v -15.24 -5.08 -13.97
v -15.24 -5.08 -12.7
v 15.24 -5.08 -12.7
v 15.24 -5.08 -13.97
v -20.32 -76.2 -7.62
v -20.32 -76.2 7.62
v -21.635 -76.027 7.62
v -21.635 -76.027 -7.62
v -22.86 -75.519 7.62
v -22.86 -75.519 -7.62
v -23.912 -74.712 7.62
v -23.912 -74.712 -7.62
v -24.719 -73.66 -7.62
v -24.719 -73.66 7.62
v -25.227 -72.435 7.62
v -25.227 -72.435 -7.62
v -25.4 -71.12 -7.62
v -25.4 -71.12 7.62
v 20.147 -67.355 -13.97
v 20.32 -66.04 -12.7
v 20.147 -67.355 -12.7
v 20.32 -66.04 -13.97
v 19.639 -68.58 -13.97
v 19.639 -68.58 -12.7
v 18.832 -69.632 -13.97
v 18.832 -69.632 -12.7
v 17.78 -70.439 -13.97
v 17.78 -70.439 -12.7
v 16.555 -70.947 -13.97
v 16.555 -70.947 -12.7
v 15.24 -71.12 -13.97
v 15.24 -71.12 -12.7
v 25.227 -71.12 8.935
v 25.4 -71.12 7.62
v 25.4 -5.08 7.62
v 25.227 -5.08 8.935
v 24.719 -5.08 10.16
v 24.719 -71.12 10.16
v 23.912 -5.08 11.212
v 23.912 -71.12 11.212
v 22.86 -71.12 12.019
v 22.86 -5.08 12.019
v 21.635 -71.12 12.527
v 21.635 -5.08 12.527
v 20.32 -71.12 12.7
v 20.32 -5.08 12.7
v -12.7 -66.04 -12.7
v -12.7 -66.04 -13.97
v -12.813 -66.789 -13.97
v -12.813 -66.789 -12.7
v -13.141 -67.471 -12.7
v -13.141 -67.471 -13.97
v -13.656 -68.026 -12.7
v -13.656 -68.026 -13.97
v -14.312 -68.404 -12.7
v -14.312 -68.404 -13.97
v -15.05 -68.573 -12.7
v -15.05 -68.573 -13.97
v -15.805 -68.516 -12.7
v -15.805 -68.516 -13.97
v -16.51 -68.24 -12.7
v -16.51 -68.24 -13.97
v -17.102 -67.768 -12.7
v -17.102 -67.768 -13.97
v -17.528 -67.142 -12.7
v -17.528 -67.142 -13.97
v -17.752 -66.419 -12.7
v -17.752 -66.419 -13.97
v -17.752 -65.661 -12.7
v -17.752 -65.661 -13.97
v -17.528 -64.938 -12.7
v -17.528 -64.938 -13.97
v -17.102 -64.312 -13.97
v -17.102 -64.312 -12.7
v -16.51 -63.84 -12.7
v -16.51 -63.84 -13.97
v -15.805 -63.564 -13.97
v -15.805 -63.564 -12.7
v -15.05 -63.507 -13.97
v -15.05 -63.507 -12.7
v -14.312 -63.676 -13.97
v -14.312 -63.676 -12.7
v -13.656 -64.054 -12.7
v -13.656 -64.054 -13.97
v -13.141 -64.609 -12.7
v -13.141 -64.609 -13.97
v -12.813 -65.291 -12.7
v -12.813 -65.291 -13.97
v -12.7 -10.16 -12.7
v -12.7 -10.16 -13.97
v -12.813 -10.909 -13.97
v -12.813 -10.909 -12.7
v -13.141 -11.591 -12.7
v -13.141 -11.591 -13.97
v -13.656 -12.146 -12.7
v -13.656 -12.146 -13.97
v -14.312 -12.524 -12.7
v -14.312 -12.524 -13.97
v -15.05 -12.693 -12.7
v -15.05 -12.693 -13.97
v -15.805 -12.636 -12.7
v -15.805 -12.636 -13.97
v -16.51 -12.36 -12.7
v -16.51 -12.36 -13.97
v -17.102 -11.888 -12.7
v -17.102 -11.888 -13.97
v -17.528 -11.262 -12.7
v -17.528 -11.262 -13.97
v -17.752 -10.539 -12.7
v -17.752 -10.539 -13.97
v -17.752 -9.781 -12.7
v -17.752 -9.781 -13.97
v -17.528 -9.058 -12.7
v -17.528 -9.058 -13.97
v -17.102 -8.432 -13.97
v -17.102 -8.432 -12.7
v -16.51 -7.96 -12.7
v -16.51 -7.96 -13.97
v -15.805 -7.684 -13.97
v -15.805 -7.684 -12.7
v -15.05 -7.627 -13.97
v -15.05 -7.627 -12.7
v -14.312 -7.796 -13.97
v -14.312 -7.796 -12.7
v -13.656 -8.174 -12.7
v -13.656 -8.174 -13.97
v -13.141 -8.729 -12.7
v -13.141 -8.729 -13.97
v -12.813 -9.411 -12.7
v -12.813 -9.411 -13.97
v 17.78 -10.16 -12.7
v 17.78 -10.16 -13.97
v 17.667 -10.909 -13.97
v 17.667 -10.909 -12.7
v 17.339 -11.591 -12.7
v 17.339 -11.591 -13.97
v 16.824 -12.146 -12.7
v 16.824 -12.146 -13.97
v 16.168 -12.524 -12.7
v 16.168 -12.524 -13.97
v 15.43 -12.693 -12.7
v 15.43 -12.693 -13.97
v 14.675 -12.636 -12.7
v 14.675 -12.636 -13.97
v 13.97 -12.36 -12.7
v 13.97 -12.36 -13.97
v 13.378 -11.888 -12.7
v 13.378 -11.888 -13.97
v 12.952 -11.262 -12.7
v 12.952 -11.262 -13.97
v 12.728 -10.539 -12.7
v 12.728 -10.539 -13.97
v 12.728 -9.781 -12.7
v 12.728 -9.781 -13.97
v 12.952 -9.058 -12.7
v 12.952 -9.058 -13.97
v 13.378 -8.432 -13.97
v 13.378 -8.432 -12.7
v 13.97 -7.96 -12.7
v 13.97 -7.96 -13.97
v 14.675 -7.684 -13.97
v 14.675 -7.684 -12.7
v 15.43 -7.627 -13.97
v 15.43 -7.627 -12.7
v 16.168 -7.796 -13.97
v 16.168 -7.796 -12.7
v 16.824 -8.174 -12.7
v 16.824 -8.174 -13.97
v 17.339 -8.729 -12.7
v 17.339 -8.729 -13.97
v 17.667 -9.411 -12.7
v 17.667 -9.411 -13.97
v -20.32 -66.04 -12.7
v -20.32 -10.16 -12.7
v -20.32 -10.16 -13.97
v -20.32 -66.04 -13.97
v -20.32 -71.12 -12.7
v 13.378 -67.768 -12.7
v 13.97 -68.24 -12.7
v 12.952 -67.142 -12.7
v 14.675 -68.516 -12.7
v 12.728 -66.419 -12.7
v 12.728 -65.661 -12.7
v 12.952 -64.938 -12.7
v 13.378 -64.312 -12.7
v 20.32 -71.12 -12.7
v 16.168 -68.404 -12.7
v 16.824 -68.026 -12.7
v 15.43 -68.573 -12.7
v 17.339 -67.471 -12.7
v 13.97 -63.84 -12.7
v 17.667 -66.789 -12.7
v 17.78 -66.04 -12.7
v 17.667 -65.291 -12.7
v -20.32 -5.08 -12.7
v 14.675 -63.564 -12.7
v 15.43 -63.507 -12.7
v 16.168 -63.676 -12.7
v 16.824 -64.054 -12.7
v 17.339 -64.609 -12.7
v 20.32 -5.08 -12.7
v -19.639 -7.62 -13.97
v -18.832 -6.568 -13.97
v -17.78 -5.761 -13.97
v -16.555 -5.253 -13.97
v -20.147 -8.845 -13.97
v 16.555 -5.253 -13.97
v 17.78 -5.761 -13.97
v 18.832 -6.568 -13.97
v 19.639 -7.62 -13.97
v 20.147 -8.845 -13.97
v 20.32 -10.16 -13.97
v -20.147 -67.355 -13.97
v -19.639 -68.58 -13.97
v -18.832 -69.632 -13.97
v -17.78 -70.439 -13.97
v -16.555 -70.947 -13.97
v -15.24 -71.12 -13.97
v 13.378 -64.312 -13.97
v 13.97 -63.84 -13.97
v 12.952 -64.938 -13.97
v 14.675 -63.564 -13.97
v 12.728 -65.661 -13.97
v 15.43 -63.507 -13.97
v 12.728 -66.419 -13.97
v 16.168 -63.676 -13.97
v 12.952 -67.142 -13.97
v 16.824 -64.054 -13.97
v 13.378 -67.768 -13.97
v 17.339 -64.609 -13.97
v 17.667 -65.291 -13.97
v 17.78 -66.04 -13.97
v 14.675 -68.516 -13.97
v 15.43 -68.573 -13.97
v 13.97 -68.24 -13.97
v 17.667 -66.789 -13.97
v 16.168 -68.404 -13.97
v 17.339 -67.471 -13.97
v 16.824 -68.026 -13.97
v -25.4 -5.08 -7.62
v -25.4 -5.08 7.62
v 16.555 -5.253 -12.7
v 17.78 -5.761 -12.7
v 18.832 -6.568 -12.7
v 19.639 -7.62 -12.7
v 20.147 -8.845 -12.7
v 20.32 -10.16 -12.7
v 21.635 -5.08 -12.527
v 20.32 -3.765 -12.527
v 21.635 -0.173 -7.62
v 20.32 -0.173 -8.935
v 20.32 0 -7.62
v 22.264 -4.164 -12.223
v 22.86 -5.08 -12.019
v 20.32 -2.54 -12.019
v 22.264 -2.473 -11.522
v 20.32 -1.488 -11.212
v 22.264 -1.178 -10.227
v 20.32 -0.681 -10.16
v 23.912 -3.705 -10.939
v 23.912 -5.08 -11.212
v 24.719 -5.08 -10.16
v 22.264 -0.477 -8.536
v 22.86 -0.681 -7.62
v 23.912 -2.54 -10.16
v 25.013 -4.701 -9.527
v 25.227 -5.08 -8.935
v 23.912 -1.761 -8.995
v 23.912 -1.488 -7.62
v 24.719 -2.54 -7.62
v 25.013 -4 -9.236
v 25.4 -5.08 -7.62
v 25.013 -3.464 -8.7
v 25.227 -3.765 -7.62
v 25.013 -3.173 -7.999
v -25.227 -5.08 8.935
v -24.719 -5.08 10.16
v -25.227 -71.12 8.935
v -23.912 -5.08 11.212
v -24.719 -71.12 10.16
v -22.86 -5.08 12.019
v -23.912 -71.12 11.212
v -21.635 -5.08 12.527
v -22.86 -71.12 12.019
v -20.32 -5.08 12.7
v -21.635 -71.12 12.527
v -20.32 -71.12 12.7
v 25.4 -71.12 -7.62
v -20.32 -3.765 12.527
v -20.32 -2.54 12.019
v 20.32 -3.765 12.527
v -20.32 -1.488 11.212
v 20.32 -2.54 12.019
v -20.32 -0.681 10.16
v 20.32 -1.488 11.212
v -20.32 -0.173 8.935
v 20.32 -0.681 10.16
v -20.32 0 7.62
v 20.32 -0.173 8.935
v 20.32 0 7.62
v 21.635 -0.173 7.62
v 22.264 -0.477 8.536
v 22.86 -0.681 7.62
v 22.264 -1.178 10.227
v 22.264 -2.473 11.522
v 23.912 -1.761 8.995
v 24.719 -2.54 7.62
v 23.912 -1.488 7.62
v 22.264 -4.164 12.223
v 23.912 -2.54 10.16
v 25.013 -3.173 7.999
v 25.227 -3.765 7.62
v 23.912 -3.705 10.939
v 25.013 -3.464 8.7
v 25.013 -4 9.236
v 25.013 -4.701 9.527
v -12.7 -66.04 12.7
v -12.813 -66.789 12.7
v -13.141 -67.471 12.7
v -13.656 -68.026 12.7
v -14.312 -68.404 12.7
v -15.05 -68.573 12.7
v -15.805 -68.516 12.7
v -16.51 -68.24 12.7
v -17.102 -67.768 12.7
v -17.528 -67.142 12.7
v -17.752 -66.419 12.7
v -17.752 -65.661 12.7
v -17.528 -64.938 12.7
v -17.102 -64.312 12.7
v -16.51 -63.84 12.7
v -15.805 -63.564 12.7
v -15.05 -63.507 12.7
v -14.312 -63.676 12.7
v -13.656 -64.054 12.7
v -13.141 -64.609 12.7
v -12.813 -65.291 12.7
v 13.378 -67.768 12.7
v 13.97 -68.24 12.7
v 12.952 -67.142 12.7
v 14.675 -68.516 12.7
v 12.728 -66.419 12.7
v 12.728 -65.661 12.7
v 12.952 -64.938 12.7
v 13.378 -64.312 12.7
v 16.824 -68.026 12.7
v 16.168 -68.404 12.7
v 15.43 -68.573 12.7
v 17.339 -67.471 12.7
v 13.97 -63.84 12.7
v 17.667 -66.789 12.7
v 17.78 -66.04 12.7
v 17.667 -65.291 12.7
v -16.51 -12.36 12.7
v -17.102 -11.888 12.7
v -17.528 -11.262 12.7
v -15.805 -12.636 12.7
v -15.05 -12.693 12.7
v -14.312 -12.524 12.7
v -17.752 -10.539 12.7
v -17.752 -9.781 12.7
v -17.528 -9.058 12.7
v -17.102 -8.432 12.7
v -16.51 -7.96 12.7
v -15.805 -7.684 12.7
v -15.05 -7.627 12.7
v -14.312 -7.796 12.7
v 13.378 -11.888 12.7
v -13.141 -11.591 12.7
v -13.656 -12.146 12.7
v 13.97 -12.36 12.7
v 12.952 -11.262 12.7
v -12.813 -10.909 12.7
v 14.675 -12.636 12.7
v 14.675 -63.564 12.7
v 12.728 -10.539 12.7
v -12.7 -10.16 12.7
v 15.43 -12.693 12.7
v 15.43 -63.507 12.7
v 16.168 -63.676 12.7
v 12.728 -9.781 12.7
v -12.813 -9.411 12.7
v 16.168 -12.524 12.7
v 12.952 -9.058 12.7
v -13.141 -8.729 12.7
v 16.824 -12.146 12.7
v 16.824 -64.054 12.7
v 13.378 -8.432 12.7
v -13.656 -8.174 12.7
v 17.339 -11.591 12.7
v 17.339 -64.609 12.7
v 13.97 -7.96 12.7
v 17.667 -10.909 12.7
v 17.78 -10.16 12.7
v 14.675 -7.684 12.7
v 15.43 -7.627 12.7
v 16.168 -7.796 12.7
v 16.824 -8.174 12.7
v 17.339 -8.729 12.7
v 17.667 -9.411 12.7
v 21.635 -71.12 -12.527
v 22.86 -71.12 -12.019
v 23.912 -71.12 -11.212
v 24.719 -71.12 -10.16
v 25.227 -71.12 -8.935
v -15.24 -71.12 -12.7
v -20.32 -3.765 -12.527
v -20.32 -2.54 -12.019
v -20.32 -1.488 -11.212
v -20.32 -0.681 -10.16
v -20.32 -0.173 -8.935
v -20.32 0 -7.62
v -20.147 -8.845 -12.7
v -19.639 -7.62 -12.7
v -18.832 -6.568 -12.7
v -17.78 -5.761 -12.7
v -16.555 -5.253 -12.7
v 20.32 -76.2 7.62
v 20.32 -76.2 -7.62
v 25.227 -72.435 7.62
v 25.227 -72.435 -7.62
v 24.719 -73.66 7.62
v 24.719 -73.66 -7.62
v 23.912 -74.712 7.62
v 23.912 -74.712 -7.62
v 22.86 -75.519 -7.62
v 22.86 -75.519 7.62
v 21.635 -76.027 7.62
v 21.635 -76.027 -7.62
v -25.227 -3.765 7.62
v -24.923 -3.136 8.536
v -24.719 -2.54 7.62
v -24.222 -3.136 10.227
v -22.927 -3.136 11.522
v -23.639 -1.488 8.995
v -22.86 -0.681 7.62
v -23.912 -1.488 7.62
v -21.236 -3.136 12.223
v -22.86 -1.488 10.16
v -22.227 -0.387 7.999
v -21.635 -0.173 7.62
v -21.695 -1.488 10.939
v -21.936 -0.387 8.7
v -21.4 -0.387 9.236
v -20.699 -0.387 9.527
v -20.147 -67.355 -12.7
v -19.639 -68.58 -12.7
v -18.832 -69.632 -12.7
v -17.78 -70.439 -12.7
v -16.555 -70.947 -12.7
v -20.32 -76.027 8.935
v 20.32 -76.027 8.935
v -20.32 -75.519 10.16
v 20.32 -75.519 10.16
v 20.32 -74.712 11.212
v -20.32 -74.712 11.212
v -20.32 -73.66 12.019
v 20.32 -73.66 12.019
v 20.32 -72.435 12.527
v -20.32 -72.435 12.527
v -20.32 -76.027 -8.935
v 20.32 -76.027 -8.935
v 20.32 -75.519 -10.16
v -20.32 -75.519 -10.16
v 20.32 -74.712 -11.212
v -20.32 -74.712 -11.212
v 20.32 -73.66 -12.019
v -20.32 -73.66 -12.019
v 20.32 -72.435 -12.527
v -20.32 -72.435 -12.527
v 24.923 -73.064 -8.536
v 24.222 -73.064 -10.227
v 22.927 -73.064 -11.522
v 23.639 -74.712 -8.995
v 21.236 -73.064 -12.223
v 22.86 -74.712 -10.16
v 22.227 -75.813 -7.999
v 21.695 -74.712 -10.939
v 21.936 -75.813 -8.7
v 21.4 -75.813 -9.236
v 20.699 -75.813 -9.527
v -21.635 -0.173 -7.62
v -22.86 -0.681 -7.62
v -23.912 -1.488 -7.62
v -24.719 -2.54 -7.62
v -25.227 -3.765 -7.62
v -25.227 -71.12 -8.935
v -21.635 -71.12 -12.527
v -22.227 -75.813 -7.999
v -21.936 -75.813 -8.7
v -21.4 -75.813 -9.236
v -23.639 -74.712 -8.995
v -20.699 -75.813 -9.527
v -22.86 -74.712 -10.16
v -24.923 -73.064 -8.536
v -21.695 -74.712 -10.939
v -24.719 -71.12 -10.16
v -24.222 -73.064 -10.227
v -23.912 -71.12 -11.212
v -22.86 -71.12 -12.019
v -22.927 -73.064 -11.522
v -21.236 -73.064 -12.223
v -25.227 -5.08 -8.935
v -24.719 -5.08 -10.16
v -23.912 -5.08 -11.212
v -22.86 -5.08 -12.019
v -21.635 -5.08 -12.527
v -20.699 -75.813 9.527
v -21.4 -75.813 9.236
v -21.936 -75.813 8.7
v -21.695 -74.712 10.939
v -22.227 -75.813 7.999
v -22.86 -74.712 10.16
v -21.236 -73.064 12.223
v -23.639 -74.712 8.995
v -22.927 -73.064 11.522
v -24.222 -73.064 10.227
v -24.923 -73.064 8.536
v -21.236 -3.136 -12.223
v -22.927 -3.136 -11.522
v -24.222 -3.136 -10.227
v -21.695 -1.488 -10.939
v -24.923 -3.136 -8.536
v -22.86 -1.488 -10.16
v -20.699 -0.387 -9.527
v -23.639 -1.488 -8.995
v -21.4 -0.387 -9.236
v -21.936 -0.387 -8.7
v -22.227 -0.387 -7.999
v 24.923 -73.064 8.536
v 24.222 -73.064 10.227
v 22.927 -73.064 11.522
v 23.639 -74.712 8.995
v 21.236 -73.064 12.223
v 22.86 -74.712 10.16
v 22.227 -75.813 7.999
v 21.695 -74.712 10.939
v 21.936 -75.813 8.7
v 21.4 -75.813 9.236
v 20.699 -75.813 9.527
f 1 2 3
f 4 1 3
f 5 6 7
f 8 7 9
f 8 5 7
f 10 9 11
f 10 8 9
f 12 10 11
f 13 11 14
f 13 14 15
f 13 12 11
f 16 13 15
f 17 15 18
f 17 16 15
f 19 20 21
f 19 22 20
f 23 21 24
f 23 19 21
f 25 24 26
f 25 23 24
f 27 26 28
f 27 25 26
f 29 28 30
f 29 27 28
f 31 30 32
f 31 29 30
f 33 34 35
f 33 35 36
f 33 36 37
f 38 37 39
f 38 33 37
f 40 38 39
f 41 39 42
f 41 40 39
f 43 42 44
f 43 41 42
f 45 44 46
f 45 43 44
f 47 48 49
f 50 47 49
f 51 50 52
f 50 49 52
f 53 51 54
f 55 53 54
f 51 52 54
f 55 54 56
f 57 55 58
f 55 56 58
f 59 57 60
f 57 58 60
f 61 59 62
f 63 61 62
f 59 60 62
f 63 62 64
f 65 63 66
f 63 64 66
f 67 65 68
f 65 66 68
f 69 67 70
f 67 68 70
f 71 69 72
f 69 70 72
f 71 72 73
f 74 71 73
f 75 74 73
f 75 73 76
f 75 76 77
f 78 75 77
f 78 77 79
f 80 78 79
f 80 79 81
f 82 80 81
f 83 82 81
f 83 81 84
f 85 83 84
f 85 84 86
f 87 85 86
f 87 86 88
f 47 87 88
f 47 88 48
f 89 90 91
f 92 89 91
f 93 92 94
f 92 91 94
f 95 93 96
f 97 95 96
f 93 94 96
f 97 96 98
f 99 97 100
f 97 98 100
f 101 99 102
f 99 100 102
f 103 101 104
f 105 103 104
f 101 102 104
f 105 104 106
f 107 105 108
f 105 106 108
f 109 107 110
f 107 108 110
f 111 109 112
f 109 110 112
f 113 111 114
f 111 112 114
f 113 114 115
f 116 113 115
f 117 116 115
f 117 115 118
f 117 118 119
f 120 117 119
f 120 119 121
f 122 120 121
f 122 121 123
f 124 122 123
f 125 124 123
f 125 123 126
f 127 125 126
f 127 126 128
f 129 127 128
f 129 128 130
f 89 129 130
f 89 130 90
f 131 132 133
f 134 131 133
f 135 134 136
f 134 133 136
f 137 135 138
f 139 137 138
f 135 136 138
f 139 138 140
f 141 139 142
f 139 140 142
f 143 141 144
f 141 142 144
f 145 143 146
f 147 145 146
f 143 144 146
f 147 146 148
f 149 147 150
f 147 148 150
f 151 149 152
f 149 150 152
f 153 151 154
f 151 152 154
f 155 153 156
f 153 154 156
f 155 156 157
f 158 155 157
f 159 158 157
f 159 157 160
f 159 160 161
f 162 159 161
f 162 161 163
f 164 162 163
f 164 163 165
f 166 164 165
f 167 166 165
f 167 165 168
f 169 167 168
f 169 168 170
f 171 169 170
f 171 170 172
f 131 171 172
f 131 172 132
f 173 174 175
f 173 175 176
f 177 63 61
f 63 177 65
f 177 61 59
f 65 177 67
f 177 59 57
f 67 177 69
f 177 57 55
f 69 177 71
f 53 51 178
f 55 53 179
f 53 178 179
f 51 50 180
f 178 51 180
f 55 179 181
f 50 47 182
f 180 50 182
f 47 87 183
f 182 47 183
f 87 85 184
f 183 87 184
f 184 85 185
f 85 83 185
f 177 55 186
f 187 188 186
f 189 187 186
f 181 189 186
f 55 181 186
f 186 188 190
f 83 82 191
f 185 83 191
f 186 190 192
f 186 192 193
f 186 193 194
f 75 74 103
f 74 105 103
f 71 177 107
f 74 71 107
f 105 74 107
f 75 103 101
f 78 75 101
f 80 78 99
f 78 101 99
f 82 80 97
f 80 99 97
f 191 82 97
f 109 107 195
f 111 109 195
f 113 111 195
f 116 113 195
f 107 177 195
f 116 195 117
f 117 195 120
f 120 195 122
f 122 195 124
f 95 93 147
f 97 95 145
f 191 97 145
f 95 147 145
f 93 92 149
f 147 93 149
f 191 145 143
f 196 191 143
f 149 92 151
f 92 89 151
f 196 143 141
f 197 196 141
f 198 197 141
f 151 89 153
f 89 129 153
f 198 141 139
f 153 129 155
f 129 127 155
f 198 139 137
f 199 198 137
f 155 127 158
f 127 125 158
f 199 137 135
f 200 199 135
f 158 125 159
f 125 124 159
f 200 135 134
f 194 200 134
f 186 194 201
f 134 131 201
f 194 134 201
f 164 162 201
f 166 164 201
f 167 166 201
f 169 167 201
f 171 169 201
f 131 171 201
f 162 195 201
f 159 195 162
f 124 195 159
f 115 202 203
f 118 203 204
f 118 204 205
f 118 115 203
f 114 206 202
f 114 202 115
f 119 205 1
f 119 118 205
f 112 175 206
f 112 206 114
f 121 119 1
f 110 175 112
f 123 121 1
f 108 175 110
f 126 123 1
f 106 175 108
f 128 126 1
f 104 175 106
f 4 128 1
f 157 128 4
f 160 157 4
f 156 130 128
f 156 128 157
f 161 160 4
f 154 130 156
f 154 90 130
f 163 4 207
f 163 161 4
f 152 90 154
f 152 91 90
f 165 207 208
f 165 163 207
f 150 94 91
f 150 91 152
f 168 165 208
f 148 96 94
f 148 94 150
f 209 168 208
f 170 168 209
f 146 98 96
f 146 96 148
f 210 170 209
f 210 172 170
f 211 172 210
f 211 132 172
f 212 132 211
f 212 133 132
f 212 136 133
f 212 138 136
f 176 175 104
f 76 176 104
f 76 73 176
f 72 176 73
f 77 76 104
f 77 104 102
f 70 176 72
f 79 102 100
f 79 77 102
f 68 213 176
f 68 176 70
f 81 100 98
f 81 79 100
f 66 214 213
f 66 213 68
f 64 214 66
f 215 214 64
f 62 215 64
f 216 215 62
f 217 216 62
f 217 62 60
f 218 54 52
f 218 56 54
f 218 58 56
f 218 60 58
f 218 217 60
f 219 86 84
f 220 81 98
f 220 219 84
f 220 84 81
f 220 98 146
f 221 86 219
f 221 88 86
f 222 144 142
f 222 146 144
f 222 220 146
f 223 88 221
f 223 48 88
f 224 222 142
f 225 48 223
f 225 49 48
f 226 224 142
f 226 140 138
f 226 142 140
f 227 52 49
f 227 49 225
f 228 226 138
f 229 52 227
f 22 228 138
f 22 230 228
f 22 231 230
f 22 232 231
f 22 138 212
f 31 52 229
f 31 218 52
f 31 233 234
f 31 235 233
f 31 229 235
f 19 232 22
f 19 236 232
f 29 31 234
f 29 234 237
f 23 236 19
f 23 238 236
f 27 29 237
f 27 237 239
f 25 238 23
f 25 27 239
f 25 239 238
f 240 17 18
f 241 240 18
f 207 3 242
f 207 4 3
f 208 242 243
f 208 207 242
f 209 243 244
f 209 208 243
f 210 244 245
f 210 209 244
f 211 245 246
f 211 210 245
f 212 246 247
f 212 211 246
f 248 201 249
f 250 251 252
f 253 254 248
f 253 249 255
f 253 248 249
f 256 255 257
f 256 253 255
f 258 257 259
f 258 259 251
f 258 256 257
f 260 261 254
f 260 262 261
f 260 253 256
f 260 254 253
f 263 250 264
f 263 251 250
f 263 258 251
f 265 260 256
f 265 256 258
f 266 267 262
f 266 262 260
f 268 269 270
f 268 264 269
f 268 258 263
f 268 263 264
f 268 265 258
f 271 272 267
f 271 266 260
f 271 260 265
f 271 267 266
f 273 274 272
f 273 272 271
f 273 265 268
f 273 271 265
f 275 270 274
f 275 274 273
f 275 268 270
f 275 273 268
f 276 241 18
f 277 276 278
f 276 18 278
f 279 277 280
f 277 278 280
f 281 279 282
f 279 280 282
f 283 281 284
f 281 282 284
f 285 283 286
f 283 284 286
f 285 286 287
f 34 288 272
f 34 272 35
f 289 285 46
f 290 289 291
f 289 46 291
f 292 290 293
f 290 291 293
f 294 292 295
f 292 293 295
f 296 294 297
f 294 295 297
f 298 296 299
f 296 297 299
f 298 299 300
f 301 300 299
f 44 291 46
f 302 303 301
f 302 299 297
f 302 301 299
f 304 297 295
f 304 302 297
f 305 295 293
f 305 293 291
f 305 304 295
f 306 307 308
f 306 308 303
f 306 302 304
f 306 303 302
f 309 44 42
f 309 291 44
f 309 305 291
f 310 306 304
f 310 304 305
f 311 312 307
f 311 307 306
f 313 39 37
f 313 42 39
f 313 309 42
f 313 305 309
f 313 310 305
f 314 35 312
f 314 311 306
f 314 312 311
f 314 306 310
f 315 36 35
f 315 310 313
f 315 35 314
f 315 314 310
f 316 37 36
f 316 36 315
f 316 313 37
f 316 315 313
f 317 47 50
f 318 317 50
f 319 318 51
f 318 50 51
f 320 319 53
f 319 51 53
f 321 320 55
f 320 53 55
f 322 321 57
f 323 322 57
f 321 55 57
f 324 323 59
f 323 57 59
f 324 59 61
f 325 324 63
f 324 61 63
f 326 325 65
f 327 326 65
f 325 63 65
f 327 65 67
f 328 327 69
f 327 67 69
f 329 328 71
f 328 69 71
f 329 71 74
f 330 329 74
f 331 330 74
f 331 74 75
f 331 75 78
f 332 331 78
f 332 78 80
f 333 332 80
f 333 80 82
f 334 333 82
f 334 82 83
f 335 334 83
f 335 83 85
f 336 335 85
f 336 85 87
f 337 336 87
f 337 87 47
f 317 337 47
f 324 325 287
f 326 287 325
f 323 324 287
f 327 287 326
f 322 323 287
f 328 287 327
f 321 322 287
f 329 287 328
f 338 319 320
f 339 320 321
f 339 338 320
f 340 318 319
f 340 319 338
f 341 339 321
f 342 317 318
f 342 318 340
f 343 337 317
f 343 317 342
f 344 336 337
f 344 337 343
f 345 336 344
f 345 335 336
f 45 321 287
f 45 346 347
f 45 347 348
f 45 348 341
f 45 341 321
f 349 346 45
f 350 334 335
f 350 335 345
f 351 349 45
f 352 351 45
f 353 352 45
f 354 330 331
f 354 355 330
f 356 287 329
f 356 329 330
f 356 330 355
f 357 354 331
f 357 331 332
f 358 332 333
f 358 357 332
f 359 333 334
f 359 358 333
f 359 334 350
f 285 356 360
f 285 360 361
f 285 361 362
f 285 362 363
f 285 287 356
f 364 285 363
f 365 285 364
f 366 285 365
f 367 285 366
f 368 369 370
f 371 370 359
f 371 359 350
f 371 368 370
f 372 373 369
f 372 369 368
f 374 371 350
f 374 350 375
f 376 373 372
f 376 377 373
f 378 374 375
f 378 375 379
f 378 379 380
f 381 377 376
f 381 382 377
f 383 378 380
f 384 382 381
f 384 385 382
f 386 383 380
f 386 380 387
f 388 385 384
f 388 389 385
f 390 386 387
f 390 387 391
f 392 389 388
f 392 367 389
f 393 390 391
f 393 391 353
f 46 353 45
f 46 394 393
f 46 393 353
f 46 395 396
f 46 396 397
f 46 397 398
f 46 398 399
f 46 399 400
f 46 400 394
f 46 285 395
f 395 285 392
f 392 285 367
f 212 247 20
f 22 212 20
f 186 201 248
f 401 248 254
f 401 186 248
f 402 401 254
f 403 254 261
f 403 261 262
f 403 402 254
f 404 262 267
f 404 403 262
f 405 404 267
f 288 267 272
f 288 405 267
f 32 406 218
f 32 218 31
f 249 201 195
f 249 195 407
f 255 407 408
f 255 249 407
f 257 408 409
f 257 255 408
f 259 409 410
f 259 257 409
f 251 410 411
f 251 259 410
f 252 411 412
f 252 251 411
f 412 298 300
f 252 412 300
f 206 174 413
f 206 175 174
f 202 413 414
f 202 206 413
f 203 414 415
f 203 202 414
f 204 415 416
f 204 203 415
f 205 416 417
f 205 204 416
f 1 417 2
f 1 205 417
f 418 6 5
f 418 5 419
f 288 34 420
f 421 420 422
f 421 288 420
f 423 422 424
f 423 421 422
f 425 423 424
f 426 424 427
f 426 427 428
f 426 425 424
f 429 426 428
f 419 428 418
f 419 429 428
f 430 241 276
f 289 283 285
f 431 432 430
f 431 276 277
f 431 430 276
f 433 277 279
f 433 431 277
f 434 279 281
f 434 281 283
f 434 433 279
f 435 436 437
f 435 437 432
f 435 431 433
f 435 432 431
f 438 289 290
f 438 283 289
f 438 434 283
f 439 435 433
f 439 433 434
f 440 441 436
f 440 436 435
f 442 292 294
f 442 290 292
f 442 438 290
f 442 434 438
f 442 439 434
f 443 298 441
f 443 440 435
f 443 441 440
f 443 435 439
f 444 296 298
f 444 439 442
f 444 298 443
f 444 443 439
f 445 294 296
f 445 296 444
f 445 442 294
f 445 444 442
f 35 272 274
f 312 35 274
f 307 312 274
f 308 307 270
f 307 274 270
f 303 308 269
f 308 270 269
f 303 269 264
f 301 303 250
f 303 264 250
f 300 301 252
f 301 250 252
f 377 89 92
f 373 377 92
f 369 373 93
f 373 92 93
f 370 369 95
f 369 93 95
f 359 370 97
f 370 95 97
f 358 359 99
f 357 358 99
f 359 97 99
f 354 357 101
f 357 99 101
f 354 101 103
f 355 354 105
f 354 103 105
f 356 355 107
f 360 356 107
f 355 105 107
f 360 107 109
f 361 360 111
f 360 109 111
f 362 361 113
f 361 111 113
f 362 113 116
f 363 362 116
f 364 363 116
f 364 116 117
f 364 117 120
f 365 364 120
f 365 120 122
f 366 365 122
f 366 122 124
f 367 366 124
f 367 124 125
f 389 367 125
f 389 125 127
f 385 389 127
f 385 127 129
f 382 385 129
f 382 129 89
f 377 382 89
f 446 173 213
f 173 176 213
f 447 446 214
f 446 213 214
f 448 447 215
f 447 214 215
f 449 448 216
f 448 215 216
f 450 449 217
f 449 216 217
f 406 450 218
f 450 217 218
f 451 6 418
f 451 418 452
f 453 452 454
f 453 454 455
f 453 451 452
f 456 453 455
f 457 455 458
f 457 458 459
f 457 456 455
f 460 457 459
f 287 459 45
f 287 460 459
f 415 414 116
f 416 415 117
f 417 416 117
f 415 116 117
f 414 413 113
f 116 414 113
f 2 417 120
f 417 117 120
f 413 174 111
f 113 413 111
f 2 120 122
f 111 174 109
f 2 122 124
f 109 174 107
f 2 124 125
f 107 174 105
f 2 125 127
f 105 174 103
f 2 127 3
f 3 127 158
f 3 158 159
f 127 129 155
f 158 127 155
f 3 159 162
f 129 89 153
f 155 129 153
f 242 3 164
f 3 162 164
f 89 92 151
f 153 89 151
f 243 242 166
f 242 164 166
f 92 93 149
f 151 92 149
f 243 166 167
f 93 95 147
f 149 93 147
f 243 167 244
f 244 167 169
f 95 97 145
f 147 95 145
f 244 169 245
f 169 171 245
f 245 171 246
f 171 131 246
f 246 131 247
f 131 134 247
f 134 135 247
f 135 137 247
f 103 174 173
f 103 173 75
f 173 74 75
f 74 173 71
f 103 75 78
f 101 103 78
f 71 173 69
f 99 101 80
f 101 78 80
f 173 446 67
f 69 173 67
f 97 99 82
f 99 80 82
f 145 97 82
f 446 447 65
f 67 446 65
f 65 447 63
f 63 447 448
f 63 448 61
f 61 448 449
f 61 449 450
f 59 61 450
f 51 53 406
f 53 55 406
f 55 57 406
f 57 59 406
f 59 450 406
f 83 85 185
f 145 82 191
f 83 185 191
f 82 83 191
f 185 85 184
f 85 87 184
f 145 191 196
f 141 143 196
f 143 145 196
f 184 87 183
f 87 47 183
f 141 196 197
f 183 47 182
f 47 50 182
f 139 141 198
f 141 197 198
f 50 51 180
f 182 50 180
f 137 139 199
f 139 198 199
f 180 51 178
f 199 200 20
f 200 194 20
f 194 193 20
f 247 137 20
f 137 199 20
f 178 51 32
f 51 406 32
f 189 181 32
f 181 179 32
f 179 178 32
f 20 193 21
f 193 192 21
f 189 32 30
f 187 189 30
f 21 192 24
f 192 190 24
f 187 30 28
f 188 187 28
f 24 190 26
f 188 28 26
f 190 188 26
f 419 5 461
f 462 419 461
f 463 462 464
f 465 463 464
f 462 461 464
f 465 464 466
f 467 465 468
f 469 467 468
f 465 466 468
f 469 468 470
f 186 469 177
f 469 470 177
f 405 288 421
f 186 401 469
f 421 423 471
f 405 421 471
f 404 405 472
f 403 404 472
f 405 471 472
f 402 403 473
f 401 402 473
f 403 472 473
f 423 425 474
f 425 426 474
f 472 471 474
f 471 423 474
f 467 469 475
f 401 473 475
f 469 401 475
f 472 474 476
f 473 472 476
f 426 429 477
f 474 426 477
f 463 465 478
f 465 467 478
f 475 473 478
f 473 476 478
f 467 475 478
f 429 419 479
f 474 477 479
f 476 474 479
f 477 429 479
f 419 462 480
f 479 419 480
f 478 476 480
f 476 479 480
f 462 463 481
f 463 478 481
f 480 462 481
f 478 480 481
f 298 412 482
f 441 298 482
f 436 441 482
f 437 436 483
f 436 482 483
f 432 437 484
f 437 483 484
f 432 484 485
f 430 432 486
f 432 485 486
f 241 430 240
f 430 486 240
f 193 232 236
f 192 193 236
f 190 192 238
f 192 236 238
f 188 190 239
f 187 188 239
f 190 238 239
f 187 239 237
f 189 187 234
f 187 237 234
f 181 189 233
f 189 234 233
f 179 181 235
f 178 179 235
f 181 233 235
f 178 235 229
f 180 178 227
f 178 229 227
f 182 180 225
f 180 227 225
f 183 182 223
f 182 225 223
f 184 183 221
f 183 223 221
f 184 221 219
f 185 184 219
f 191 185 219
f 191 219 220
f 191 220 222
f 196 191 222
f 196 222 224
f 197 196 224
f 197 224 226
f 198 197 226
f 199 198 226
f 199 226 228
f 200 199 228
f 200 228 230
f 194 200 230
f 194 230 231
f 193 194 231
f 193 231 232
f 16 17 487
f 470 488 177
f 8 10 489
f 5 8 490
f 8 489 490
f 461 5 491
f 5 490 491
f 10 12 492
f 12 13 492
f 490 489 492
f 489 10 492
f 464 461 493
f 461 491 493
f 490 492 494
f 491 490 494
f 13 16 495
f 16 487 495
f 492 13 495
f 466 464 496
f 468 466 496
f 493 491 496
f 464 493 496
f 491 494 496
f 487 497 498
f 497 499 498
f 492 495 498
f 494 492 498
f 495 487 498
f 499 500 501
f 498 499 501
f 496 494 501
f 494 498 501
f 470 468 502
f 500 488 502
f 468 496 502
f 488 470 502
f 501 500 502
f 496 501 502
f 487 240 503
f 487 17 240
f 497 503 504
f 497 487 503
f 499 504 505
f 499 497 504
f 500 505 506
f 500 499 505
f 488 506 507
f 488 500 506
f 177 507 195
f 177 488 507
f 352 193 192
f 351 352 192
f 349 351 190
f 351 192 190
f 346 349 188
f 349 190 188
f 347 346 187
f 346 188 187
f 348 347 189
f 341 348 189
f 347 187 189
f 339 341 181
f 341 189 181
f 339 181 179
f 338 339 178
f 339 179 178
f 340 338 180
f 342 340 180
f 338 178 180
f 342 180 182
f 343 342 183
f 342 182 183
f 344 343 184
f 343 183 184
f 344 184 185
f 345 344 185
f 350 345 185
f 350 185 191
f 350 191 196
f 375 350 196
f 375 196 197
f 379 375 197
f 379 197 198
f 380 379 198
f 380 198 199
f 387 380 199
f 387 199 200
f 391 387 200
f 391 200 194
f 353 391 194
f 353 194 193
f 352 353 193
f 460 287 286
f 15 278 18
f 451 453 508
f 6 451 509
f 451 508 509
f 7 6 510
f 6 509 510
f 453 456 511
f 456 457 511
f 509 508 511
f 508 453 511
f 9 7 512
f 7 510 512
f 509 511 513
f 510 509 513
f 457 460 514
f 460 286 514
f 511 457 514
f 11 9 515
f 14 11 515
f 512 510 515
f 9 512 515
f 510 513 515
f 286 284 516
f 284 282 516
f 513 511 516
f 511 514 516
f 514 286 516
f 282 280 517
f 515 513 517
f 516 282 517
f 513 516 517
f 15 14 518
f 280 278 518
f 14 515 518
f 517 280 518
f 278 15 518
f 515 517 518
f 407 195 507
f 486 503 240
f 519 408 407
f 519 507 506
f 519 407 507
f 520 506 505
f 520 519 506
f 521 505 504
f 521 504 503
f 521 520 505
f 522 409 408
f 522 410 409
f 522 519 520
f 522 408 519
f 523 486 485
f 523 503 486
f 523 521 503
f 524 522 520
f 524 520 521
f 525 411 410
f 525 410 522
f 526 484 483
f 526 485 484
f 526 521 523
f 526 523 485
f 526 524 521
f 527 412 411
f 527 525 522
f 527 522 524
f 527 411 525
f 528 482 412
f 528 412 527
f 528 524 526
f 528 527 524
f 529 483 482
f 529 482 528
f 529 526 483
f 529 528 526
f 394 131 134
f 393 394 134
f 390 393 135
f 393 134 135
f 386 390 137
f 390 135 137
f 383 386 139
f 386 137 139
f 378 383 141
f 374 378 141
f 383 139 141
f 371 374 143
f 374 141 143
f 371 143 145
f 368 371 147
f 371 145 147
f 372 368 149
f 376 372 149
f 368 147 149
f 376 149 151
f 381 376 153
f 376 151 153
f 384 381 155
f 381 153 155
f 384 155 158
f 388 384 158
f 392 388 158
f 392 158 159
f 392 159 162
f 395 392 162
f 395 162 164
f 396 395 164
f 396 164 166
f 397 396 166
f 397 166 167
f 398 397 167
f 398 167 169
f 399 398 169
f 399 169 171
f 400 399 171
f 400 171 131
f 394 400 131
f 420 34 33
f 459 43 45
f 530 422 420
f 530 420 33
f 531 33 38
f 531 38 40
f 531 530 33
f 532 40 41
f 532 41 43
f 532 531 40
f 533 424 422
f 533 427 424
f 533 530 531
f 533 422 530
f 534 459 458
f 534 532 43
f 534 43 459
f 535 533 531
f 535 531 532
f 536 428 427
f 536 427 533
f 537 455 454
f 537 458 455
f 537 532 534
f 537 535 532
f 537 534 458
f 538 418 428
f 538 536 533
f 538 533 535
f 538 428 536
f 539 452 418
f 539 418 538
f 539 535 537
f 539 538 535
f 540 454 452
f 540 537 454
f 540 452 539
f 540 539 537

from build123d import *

# Parameters (mm, degrees)
F0_W         = 50.8
F0_H         = 25.4
F1_DEPTH     = 76.2
F2_R         = 5.08
F3_T1_DEPTH  = 15.24
F3_T3_DEPTH  = 40.64
F3_S7_W      = 5.08
F3_S7_H      = 5.08
F3_T8_DEPTH  = 5.08
F3_S13_W     = 5.08
F3_S13_H     = 5.08
F3_T14_DEPTH = 5.08
F3_S19_W     = 5.08
F3_S19_H     = 5.08
F3_T20_DEPTH = 5.08
F3_S25_W     = 5.08
F3_S25_H     = 5.08
F3_T26_DEPTH = 5.08
F3_T30_ANGLE = 90
F3_T32_ANGLE = 90
F3_T34_ANGLE = 90
F3_T36_ANGLE = 90
F5_W         = 40.64
F5_H         = 66.04
F6_DEPTH     = 1.27
F7_R         = 5.08
F8_R         = 2.54
F9_DEPTH     = 101.6
F10_R        = 2.54
F11_DEPTH    = 101.6


# Not quite as in the source:
# - a fillet or chamfer that OpenCascade refuses, or shapes differently, is made with other operations: its cross-section is extruded or revolved along the edge and cut away or added
# - two fillets or chamfers of one size are made in one step


with BuildPart() as f1:
    # F0 (on Front) → F1 (new body)
    with BuildSketch(Plane.XZ):
        Rectangle(F0_W, F0_H)
    extrude(amount=F1_DEPTH)

    # F2
    f2_edges = [f1.edges().sort_by_distance(p)[0] for p in [
        (25.4, -38.1, 12.7),
        (0, 0, 12.7),
        (-25.4, -38.1, 12.7),
        (25.4, -38.1, -12.7),
        (-25.4, -38.1, -12.7),
        (0, 0, -12.7),
    ]]
    fillet(f2_edges, radius=F2_R)

    # F3: fillet of radius 5.08 on 12 edges, made by hand

    # F3_s2 → F3_t1 (cut)
    with BuildSketch(Plane.XY.offset(-7.62)):
        with BuildLine():
            ThreePointArc((25.4, -5.08), (23.9121024484, -1.4878975516), (20.32, 0))
            Line((20.32, 0), (25.4, 0))
            Line((25.4, 0), (25.4, -5.08))
        make_face()
        with BuildLine():
            ThreePointArc((25.4, -71.12), (23.9121024484, -74.7121024484), (20.32, -76.2))
            Line((20.32, -76.2), (25.4, -76.2))
            Line((25.4, -76.2), (25.4, -71.12))
        make_face()
        with BuildLine():
            ThreePointArc((-20.32, 0), (-23.9121024484, -1.4878975516), (-25.4, -5.08))
            Line((-25.4, -5.08), (-25.4, 0))
            Line((-25.4, 0), (-20.32, 0))
        make_face()
        with BuildLine():
            ThreePointArc((-20.32, -76.2), (-23.9121024484, -74.7121024484), (-25.4, -71.12))
            Line((-25.4, -71.12), (-25.4, -76.2))
            Line((-25.4, -76.2), (-20.32, -76.2))
        make_face()
    extrude(amount=F3_T1_DEPTH, mode=Mode.SUBTRACT)

    # F3_s4 → F3_t3 (cut)
    with BuildSketch(Plane.YZ.offset(-20.32)):
        with BuildLine():
            ThreePointArc((-76.2, -7.62), (-74.7121024484, -11.2121024484), (-71.12, -12.7))
            Line((-71.12, -12.7), (-76.2, -12.7))
            Line((-76.2, -12.7), (-76.2, -7.62))
        make_face()
        with BuildLine():
            ThreePointArc((-76.2, 7.62), (-74.7121024484, 11.2121024484), (-71.12, 12.7))
            Line((-71.12, 12.7), (-76.2, 12.7))
            Line((-76.2, 12.7), (-76.2, 7.62))
        make_face()
    extrude(amount=F3_T3_DEPTH, mode=Mode.SUBTRACT)


with BuildPart() as f3_tool6:
    # F3_s7 → F3_t8 (new body)
    with BuildSketch(Plane.YZ.offset(20.32)):
        with Locations((-2.54, 10.16)):
            Rectangle(F3_S7_W, F3_S7_H)
    extrude(amount=F3_T8_DEPTH)

    # F3_s9 → F3_t10 (revolve, cut)
    with BuildSketch(Plane(origin=(20.32, -5.08, 7.62), x_dir=(0, -0.7071067812, -0.7071067812), z_dir=(0, -0.7071067812, 0.7071067812))):
        with BuildLine():
            ThreePointArc((0, -5.08), (5.08, 0), (0, 5.08))
            Line((0, 5.08), (0, -5.08))
        make_face()
    revolve(axis=Axis((20.32, -5.08, 7.62), (1, 0, 0)), mode=Mode.SUBTRACT)


with BuildPart() as f1_1:
    add(f1.part)

    # F3_t5: cut F3_tool6
    add(f3_tool6.part, mode=Mode.SUBTRACT)


with BuildPart() as f3_tool12:
    # F3_s13 → F3_t14 (new body)
    with BuildSketch(Plane.XZ.offset(5.08)):
        with Locations((-22.86, 10.16)):
            Rectangle(F3_S13_W, F3_S13_H)
    extrude(amount=-F3_T14_DEPTH)

    # F3_s15 → F3_t16 (revolve, cut)
    with BuildSketch(Plane(origin=(-20.32, -5.08, 7.62), x_dir=(0.7071067812, 0, -0.7071067812), z_dir=(0.7071067812, 0, 0.7071067812))):
        with BuildLine():
            ThreePointArc((0, -5.08), (5.08, 0), (0, 5.08))
            Line((0, 5.08), (0, -5.08))
        make_face()
    revolve(axis=Axis((-20.32, -5.08, 7.62), (0, 1, 0)), mode=Mode.SUBTRACT)


with BuildPart() as f1_2:
    add(f1_1.part)

    # F3_t11: cut F3_tool12
    add(f3_tool12.part, mode=Mode.SUBTRACT)


with BuildPart() as f3_tool18:
    # F3_s19 → F3_t20 (new body)
    with BuildSketch(Plane.XZ.offset(5.08)):
        with Locations((-22.86, -10.16)):
            Rectangle(F3_S19_W, F3_S19_H)
    extrude(amount=-F3_T20_DEPTH)

    # F3_s21 → F3_t22 (revolve, cut)
    with BuildSketch(Plane(origin=(-20.32, -5.08, -7.62), x_dir=(0.7071067812, 0, 0.7071067812), z_dir=(-0.7071067812, 0, 0.7071067812))):
        with BuildLine():
            ThreePointArc((0, -5.08), (5.08, 0), (0, 5.08))
            Line((0, 5.08), (0, -5.08))
        make_face()
    revolve(axis=Axis((-20.32, -5.08, -7.62), (0, 1, 0)), mode=Mode.SUBTRACT)


with BuildPart() as f1_3:
    add(f1_2.part)

    # F3_t17: cut F3_tool18
    add(f3_tool18.part, mode=Mode.SUBTRACT)


with BuildPart() as f3_tool24:
    # F3_s25 → F3_t26 (new body)
    with BuildSketch(Plane.YZ.offset(20.32)):
        with Locations((-2.54, -10.16)):
            Rectangle(F3_S25_W, F3_S25_H)
    extrude(amount=F3_T26_DEPTH)

    # F3_s27 → F3_t28 (revolve, cut)
    with BuildSketch(Plane(origin=(20.32, -5.08, -7.62), x_dir=(0, -0.7071067812, 0.7071067812), z_dir=(0, 0.7071067812, 0.7071067812))):
        with BuildLine():
            ThreePointArc((0, -5.08), (5.08, 0), (0, 5.08))
            Line((0, 5.08), (0, -5.08))
        make_face()
    revolve(axis=Axis((20.32, -5.08, -7.62), (1, 0, 0)), mode=Mode.SUBTRACT)


with BuildPart() as f1_4:
    add(f1_3.part)

    # F3_t23: cut F3_tool24
    add(f3_tool24.part, mode=Mode.SUBTRACT)

    # F3_s29 → F3_t30 (revolve, cut)
    with BuildSketch(Plane.XY.offset(-7.62)):
        with BuildLine():
            ThreePointArc((25.4, -71.12), (23.9121024484, -74.7121024484), (20.32, -76.2))
            Line((20.32, -76.2), (25.4, -76.2))
            Line((25.4, -76.2), (25.4, -71.12))
        make_face()
    revolve(axis=Axis((20.32, -76.2, -7.62), (0, 1, 0)), revolution_arc=F3_T30_ANGLE, mode=Mode.SUBTRACT)

    # F3_s31 → F3_t32 (revolve, cut)
    with BuildSketch(Plane.XY.offset(7.62)):
        with BuildLine():
            ThreePointArc((25.4, -71.12), (23.9121024484, -74.7121024484), (20.32, -76.2))
            Line((20.32, -76.2), (25.4, -76.2))
            Line((25.4, -76.2), (25.4, -71.12))
        make_face()
    revolve(axis=Axis((20.32, -76.2, 7.62), (0, -1, 0)), revolution_arc=F3_T32_ANGLE, mode=Mode.SUBTRACT)

    # F3_s33 → F3_t34 (revolve, cut)
    with BuildSketch(Plane.XY.offset(-7.62)):
        with BuildLine():
            ThreePointArc((-20.32, -76.2), (-23.9121024484, -74.7121024484), (-25.4, -71.12))
            Line((-25.4, -71.12), (-25.4, -76.2))
            Line((-25.4, -76.2), (-20.32, -76.2))
        make_face()
    revolve(axis=Axis((-20.32, -76.2, -7.62), (0, -1, 0)), revolution_arc=F3_T34_ANGLE, mode=Mode.SUBTRACT)

    # F3_s35 → F3_t36 (revolve, cut)
    with BuildSketch(Plane.YZ.offset(-20.32)):
        with BuildLine():
            ThreePointArc((-76.2, 7.62), (-74.7121024484, 11.2121024484), (-71.12, 12.7))
            Line((-71.12, 12.7), (-76.2, 12.7))
            Line((-76.2, 12.7), (-76.2, 7.62))
        make_face()
    revolve(axis=Axis((-20.32, -76.2, 7.62), (0, -1, 0)), revolution_arc=F3_T36_ANGLE, mode=Mode.SUBTRACT)


with BuildPart() as f6:
    # F5 (on face) → F6 (new body)
    with BuildSketch(Plane(origin=(0, 0, -12.7), x_dir=(1, 0, 0), z_dir=(0, 0, -1))):
        with Locations((0, 38.1)):
            Rectangle(F5_W, F5_H)
    extrude(amount=F6_DEPTH)

    # F7
    f7_edges = [f6.edges().sort_by_distance(p)[0] for p in [
        (-20.32, -5.08, -13.335),
        (20.32, -5.08, -13.335),
        (20.32, -71.12, -13.335),
        (-20.32, -71.12, -13.335),
    ]]
    fillet(f7_edges, radius=F7_R)


with BuildPart() as f9_tool:
    # F8 (on face) → F9 (new body)
    with BuildSketch(Plane(origin=(0, 0, -13.97), x_dir=(1, 0, 0), z_dir=(0, 0, -1))):
        with Locations((15.24, 10.16)):
            Circle(F8_R)
        with Locations((15.24, 66.04)):
            Circle(F8_R)
        with Locations((-15.24, 66.04)):
            Circle(F8_R)
        with Locations((-15.24, 10.16)):
            Circle(F8_R)
    extrude(amount=-F9_DEPTH)


with BuildPart() as f1_5:
    add(f1_4.part)

    # F9: cut by f9_tool
    add(f9_tool.part, mode=Mode.SUBTRACT)

    # F10 (on face) → F11 (cut)
    with BuildSketch(Plane(origin=(0, 0, -12.7), x_dir=(1, 0, 0), z_dir=(0, 0, -1))):
        with Locations((15.24, 66.04)):
            Circle(F10_R)
        with Locations((-15.24, 66.04)):
            Circle(F10_R)
        with Locations((15.24, 10.16)):
            Circle(F10_R)
        with Locations((-15.24, 10.16)):
            Circle(F10_R)
    extrude(amount=-F11_DEPTH, mode=Mode.SUBTRACT)


with BuildPart() as f6_1:
    add(f6.part)

    # F9: cut by f9_tool
    add(f9_tool.part, mode=Mode.SUBTRACT)


solid = Compound([f1_5.part, f6_1.part])
